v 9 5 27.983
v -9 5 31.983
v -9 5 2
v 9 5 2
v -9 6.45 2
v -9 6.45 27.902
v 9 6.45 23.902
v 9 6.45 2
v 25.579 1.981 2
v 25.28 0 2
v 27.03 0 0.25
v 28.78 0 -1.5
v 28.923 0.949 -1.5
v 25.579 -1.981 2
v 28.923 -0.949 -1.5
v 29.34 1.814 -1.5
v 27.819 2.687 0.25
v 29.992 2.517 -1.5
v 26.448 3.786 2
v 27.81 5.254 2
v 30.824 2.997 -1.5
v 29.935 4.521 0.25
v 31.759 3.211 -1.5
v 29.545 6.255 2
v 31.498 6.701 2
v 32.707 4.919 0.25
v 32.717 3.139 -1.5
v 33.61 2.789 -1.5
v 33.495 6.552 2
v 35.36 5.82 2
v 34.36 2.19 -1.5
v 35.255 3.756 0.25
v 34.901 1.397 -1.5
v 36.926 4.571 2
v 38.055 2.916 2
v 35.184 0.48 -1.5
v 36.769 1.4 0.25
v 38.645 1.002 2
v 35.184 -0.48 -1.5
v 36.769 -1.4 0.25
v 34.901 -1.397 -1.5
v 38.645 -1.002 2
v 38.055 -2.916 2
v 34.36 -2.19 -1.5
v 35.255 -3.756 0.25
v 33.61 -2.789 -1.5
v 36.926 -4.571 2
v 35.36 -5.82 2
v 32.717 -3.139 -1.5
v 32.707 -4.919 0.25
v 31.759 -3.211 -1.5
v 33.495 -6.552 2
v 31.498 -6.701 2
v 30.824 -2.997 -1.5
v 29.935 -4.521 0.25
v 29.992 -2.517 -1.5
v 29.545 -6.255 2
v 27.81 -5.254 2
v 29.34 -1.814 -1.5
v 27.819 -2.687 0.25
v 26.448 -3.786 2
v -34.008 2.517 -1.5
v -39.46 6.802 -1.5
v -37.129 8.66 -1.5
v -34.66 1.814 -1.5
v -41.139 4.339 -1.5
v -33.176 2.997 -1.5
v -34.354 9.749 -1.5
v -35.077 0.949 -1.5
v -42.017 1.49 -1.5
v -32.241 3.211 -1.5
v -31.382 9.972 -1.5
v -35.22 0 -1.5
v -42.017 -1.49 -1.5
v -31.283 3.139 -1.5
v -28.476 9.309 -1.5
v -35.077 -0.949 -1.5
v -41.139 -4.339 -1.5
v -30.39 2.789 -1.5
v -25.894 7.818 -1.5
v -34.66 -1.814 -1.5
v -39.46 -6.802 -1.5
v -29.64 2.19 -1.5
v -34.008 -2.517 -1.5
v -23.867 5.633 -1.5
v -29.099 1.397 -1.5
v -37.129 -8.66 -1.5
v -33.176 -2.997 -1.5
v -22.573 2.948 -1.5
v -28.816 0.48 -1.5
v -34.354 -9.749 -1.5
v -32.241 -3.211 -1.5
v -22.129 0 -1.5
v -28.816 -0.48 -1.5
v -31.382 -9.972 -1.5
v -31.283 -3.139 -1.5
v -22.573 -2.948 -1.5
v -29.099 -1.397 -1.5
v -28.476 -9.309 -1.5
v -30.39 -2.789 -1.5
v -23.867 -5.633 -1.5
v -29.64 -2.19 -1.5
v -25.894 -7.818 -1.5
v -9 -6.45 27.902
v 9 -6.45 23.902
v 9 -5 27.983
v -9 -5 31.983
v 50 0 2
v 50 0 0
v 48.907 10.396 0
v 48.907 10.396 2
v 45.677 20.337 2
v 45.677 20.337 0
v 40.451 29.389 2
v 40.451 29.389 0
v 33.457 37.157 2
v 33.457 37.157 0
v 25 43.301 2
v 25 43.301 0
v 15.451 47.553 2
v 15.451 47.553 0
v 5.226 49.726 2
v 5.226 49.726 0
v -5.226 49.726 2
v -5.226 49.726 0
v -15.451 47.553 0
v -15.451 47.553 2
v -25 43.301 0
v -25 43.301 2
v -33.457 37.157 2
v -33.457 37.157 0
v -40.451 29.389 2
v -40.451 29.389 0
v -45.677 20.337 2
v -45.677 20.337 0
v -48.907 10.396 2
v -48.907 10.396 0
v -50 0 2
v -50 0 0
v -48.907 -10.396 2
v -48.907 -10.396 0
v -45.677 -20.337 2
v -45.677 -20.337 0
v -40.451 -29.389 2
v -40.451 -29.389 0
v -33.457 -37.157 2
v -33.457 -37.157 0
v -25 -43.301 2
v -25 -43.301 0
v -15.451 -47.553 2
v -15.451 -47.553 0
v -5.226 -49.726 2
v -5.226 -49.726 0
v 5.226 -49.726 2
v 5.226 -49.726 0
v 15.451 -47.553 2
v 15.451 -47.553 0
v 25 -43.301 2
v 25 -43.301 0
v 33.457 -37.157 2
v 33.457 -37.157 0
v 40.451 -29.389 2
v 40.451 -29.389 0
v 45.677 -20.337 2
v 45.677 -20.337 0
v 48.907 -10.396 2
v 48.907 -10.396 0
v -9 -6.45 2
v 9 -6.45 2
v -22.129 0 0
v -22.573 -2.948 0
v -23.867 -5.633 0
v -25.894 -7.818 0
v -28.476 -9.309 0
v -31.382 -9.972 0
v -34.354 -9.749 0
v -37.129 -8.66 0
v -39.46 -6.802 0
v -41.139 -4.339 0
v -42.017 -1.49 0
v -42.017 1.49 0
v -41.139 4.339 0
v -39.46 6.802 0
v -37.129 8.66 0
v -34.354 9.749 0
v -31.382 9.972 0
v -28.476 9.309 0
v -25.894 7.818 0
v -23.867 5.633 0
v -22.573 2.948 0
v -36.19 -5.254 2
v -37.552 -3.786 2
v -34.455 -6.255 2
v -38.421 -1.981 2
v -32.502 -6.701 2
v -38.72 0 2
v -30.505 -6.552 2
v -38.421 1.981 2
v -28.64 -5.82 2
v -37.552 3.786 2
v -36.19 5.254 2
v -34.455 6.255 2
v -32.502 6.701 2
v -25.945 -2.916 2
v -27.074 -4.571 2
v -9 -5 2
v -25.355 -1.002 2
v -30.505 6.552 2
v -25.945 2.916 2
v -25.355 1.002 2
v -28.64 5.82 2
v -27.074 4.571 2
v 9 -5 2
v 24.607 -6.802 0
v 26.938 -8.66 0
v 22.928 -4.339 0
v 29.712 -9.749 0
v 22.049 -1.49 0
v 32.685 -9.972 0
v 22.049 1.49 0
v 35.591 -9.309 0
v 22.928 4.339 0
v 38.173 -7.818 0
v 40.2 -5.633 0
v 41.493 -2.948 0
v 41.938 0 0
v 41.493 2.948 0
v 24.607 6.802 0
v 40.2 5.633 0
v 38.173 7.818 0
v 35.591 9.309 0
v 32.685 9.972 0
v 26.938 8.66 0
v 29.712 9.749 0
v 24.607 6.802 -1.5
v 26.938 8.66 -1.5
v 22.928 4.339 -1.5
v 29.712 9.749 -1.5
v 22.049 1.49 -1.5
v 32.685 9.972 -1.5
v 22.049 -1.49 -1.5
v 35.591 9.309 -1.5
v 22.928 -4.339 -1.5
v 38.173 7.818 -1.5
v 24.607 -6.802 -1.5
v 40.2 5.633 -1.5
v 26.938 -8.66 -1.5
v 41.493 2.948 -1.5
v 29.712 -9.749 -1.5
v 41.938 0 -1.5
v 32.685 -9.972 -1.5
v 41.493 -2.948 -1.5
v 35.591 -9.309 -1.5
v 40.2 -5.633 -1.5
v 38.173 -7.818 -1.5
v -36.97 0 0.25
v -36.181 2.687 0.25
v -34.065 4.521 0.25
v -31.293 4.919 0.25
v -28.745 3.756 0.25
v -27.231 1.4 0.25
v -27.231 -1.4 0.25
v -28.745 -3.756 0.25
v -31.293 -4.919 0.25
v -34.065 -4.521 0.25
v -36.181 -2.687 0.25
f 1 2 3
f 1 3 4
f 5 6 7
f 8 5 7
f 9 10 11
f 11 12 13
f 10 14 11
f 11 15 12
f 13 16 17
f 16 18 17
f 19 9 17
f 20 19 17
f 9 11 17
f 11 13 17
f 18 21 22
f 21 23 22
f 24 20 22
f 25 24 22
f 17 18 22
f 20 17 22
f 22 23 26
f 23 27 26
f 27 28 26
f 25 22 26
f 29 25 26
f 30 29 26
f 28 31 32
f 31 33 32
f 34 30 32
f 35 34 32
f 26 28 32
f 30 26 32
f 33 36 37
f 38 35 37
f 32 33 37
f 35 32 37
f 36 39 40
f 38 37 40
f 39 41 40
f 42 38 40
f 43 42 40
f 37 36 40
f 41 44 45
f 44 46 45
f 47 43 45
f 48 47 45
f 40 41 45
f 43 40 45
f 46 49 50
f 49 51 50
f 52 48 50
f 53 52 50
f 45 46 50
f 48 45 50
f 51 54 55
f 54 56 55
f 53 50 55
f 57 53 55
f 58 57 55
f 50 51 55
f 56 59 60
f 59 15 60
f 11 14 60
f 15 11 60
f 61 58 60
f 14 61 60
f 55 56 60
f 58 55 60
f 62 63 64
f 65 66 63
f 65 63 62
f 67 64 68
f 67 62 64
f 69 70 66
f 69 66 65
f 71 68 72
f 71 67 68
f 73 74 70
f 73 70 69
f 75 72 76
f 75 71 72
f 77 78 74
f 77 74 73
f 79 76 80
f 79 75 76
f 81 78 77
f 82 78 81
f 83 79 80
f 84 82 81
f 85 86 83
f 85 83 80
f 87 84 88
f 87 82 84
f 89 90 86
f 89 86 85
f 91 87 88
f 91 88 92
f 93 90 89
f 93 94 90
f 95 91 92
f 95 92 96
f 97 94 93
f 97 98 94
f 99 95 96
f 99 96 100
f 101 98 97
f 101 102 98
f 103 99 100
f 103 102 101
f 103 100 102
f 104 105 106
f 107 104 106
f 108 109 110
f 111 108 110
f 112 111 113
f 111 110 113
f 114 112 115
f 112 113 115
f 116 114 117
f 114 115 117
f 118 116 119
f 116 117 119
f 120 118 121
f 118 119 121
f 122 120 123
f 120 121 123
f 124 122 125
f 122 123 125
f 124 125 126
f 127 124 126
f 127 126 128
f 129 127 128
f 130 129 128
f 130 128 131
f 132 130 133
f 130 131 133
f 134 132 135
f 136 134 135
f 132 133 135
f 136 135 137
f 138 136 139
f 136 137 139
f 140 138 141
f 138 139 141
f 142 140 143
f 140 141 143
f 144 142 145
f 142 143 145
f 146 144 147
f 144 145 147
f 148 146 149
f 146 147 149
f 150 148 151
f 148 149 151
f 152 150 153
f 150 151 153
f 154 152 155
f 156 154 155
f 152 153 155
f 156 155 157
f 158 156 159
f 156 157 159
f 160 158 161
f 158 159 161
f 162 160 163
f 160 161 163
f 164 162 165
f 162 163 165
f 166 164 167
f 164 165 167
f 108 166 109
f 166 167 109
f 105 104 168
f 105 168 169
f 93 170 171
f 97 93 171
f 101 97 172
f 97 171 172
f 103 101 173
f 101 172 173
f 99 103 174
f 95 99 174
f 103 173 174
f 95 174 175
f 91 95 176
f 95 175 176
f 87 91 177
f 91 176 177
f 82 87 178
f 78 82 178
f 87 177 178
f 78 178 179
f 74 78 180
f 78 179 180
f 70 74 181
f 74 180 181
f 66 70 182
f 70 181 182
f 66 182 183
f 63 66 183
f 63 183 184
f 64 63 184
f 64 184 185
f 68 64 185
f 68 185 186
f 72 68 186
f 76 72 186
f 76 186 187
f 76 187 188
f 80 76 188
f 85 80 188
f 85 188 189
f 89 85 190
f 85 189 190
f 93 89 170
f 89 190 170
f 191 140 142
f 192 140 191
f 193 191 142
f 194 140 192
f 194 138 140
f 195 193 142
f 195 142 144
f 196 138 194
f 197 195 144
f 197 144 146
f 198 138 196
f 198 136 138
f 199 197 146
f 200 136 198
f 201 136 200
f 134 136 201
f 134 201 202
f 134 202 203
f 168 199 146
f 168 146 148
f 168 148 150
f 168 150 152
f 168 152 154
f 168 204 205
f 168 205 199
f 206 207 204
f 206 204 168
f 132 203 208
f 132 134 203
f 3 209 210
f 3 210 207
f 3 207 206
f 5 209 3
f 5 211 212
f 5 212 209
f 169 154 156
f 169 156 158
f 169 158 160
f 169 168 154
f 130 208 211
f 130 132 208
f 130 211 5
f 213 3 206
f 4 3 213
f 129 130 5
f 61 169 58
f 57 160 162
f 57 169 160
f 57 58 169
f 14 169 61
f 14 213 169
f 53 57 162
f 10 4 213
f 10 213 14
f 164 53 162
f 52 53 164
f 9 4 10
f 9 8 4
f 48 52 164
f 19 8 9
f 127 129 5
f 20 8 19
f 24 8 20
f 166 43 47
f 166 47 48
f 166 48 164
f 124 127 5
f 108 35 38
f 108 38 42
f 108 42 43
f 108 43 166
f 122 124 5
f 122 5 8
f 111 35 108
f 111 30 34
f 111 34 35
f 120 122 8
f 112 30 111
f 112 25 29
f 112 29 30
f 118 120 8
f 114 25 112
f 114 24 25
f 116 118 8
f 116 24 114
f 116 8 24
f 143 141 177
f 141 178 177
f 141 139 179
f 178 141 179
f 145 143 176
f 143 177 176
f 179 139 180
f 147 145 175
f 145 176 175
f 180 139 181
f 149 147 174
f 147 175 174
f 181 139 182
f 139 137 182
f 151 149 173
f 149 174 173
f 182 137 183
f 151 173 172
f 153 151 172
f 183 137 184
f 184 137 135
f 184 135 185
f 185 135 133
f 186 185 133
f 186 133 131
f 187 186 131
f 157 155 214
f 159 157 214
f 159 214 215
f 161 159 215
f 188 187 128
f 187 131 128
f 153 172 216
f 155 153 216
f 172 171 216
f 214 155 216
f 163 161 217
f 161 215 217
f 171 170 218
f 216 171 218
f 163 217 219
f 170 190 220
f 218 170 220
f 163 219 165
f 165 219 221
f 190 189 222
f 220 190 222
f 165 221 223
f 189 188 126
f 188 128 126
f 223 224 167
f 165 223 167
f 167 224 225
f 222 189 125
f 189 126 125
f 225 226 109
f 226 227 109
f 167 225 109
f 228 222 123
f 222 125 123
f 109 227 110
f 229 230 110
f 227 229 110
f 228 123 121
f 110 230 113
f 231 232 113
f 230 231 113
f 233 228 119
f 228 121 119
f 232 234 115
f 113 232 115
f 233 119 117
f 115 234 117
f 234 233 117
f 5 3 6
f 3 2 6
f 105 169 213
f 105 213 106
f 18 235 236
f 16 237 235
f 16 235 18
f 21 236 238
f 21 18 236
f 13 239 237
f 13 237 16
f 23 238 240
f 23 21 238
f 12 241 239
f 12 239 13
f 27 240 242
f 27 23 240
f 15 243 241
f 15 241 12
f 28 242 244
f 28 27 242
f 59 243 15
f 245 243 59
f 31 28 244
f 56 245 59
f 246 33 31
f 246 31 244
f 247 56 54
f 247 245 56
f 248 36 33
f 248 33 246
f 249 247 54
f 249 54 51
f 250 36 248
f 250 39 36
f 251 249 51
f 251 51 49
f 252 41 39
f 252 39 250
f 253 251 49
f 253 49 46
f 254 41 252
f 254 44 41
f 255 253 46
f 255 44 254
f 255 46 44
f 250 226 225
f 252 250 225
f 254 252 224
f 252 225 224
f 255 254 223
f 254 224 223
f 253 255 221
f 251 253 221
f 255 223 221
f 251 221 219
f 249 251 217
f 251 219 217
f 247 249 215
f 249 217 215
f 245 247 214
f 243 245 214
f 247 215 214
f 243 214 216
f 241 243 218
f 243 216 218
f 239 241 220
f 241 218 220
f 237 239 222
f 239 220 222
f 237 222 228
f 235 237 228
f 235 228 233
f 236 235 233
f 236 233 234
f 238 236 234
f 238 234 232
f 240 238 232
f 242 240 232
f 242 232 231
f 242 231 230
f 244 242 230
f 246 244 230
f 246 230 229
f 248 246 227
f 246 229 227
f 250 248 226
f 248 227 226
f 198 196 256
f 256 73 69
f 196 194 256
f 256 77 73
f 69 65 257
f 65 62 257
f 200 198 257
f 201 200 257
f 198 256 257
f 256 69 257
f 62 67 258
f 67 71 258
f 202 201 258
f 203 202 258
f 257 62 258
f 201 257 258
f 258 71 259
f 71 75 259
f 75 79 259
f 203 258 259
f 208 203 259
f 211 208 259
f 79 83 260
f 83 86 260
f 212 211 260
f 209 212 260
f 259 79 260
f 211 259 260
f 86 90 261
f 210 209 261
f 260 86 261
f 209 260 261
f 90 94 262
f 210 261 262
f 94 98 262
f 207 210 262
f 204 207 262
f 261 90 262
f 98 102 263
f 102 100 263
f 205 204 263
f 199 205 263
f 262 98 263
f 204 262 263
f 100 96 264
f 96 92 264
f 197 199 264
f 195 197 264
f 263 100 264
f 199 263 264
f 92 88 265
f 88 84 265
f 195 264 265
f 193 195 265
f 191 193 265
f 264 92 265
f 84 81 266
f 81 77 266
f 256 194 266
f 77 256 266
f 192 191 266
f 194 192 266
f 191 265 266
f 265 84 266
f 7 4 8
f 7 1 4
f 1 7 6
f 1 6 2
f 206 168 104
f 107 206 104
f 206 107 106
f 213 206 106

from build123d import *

# Parameters (mm, degrees)
F0_R           = 50
F1_DEPTH       = 2
F3_R           = 10
F4_DEPTH       = 1.5
F5_D           = 6.4
F5_CSINK_D     = 13.44
F5_CSINK_ANGLE = 90
F6_W           = 18
F6_H           = 1.45
F7_DEPTH       = 30
F9_DEPTH       = 25
F10_T1_DEPTH   = 39.192646775


# Not quite as in the source:
# - a fillet or chamfer that OpenCascade refuses, or shapes differently, is made with other operations: its cross-section is extruded or revolved along the edge and cut away or added


with BuildPart() as f1:
    # F0 (on Top) → F1 (new body)
    with BuildSketch(Plane.XY):
        Circle(F0_R)
    extrude(amount=F1_DEPTH)

    # F3 (on face) → F4 (join)
    with BuildSketch(Plane(origin=(0, 0, 0), x_dir=(1, 0, 0), z_dir=(0, 0, -1))):
        with Locations((31.9376476109, 0)):
            Circle(F3_R)
        with Locations((-32.1291722357, 0)):
            Circle(F3_R)
    extrude(amount=F4_DEPTH)

    # F5 (through all)
    with Locations(Plane.XY.offset(2)):
        with Locations((-32, 0), (32, 0)):
            CounterSinkHole(F5_D / 2, F5_CSINK_D / 2, counter_sink_angle=F5_CSINK_ANGLE)

    # F6 (on face) → F7 (join)
    with BuildSketch(Plane.XY.offset(2)):
        with Locations((0, 5.725)):
            Rectangle(F6_W, F6_H)
        with Locations((0, -5.725)):
            Rectangle(F6_W, F6_H)
    extrude(amount=F7_DEPTH)

    # F8 (on face) → F9 (cut)
    with BuildSketch(Plane.XZ.offset(6.45)):
        Polygon((9, 32), (-9, 32), (9, 28), align=None)
    extrude(amount=-F9_DEPTH, mode=Mode.SUBTRACT)

    # F10: chamfer of 4 x 1.4558809371 on 2 edges, made by hand

    # F10_s2 → F10_t1 (cut)
    with BuildSketch(Plane(origin=(-25.4826184945, 0, 5.6628041099), x_dir=(0, 1, 0), z_dir=(0.9761870602, 0, -0.2169304578))):
        Polygon((6.45, 25.2856118055), (4.9941190629, 29.2856118055), (6.45, 29.2856118055), align=None)
        Polygon((-6.45, 25.2856118055), (-4.9941190629, 29.2856118055), (-6.45, 29.2856118055), align=None)
    extrude(amount=F10_T1_DEPTH, mode=Mode.SUBTRACT)


solid = f1.part
